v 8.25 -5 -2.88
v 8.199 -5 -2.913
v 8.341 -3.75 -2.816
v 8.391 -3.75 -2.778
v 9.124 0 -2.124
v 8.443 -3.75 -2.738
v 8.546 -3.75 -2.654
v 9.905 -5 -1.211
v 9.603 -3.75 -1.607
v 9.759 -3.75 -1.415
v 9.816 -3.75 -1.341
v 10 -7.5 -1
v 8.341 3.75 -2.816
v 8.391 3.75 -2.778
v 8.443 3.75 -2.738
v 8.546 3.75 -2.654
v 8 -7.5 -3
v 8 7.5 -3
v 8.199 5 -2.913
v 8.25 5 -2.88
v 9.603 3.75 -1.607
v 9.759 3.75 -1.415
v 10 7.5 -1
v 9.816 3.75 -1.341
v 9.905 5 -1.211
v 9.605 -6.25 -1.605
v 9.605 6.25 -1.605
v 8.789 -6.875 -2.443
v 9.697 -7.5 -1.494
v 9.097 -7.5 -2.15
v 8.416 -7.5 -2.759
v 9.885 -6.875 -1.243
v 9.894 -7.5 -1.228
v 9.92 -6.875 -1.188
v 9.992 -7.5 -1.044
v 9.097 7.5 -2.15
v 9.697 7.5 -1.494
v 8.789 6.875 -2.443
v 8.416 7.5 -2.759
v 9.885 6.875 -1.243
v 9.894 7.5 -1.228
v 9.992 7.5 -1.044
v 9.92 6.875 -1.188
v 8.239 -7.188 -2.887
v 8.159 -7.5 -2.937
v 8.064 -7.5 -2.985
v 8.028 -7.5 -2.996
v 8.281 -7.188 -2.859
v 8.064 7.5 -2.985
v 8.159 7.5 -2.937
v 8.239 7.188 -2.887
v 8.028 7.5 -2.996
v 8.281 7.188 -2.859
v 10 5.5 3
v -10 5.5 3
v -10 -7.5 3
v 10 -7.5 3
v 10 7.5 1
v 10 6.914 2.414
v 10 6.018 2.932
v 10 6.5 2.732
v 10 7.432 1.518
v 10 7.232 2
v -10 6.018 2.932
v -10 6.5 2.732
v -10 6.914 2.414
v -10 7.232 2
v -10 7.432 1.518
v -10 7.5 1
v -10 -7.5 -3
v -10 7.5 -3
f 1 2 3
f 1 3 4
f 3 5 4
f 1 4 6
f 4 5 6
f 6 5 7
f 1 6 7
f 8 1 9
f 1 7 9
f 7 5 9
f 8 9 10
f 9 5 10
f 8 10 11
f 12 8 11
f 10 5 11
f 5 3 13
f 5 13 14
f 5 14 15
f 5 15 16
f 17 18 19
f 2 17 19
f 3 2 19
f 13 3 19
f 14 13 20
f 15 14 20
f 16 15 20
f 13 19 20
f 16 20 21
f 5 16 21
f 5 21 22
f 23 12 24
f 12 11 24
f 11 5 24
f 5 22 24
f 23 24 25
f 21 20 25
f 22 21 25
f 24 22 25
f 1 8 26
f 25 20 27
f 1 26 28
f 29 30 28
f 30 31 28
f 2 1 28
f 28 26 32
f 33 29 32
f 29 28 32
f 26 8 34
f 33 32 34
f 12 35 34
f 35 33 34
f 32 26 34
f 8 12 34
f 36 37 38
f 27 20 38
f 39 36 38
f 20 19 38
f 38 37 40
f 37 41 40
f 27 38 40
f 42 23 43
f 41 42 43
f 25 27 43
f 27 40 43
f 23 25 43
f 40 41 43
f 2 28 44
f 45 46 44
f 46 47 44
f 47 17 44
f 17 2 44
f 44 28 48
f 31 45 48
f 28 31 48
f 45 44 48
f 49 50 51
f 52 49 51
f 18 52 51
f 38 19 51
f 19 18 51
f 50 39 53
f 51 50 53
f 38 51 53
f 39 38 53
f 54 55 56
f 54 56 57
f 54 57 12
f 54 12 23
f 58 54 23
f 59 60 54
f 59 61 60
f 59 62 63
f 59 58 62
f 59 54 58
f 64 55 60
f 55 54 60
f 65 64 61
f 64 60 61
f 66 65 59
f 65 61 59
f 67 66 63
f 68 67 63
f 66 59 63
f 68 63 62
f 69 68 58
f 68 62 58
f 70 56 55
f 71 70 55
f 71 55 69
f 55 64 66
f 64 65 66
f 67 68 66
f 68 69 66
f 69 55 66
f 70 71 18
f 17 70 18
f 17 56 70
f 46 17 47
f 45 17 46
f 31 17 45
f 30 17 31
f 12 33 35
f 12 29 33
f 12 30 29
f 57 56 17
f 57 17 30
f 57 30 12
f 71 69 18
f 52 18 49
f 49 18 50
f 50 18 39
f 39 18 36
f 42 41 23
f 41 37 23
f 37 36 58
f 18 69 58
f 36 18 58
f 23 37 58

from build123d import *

# Parameters (mm, degrees)
SKETCH_1_W      = 20
SKETCH_1_H      = 15
EXTRUDE_1_DEPTH = 3
FILLET_1_R      = 2
FILLET_3_SIZE   = 2


with BuildPart() as part:
    # 草图1 → 凸台-拉伸1 (new, symmetric)
    with BuildSketch(Plane.XY):
        Rectangle(SKETCH_1_W, SKETCH_1_H)
    extrude(amount=EXTRUDE_1_DEPTH, both=True)

    # 圆角1
    fillet_1_edges = [part.edges().sort_by_distance(p)[0] for p in [
        (0, 7.5, 3),
    ]]
    fillet(fillet_1_edges, radius=FILLET_1_R)

    # 圆角3
    # a fillet whose section is not a circle: 2 mm, written as the material it takes off along each edge
    with BuildSketch(Plane(origin=(10, 12.5, -3), x_dir=(-1, 0, 0), z_dir=(0, -1, 0))) as fillet_3_piece_1:
        with BuildLine():
            Bezier((FILLET_3_SIZE, 0), (0, 0), (0, -FILLET_3_SIZE), weights=[1, 0.141421356, 1])
            Line((0, -FILLET_3_SIZE), (0, 0))
            Line((0, 0), (FILLET_3_SIZE, 0))
        make_face()
    extrude(amount=25, mode=Mode.SUBTRACT)


solid = part.part
